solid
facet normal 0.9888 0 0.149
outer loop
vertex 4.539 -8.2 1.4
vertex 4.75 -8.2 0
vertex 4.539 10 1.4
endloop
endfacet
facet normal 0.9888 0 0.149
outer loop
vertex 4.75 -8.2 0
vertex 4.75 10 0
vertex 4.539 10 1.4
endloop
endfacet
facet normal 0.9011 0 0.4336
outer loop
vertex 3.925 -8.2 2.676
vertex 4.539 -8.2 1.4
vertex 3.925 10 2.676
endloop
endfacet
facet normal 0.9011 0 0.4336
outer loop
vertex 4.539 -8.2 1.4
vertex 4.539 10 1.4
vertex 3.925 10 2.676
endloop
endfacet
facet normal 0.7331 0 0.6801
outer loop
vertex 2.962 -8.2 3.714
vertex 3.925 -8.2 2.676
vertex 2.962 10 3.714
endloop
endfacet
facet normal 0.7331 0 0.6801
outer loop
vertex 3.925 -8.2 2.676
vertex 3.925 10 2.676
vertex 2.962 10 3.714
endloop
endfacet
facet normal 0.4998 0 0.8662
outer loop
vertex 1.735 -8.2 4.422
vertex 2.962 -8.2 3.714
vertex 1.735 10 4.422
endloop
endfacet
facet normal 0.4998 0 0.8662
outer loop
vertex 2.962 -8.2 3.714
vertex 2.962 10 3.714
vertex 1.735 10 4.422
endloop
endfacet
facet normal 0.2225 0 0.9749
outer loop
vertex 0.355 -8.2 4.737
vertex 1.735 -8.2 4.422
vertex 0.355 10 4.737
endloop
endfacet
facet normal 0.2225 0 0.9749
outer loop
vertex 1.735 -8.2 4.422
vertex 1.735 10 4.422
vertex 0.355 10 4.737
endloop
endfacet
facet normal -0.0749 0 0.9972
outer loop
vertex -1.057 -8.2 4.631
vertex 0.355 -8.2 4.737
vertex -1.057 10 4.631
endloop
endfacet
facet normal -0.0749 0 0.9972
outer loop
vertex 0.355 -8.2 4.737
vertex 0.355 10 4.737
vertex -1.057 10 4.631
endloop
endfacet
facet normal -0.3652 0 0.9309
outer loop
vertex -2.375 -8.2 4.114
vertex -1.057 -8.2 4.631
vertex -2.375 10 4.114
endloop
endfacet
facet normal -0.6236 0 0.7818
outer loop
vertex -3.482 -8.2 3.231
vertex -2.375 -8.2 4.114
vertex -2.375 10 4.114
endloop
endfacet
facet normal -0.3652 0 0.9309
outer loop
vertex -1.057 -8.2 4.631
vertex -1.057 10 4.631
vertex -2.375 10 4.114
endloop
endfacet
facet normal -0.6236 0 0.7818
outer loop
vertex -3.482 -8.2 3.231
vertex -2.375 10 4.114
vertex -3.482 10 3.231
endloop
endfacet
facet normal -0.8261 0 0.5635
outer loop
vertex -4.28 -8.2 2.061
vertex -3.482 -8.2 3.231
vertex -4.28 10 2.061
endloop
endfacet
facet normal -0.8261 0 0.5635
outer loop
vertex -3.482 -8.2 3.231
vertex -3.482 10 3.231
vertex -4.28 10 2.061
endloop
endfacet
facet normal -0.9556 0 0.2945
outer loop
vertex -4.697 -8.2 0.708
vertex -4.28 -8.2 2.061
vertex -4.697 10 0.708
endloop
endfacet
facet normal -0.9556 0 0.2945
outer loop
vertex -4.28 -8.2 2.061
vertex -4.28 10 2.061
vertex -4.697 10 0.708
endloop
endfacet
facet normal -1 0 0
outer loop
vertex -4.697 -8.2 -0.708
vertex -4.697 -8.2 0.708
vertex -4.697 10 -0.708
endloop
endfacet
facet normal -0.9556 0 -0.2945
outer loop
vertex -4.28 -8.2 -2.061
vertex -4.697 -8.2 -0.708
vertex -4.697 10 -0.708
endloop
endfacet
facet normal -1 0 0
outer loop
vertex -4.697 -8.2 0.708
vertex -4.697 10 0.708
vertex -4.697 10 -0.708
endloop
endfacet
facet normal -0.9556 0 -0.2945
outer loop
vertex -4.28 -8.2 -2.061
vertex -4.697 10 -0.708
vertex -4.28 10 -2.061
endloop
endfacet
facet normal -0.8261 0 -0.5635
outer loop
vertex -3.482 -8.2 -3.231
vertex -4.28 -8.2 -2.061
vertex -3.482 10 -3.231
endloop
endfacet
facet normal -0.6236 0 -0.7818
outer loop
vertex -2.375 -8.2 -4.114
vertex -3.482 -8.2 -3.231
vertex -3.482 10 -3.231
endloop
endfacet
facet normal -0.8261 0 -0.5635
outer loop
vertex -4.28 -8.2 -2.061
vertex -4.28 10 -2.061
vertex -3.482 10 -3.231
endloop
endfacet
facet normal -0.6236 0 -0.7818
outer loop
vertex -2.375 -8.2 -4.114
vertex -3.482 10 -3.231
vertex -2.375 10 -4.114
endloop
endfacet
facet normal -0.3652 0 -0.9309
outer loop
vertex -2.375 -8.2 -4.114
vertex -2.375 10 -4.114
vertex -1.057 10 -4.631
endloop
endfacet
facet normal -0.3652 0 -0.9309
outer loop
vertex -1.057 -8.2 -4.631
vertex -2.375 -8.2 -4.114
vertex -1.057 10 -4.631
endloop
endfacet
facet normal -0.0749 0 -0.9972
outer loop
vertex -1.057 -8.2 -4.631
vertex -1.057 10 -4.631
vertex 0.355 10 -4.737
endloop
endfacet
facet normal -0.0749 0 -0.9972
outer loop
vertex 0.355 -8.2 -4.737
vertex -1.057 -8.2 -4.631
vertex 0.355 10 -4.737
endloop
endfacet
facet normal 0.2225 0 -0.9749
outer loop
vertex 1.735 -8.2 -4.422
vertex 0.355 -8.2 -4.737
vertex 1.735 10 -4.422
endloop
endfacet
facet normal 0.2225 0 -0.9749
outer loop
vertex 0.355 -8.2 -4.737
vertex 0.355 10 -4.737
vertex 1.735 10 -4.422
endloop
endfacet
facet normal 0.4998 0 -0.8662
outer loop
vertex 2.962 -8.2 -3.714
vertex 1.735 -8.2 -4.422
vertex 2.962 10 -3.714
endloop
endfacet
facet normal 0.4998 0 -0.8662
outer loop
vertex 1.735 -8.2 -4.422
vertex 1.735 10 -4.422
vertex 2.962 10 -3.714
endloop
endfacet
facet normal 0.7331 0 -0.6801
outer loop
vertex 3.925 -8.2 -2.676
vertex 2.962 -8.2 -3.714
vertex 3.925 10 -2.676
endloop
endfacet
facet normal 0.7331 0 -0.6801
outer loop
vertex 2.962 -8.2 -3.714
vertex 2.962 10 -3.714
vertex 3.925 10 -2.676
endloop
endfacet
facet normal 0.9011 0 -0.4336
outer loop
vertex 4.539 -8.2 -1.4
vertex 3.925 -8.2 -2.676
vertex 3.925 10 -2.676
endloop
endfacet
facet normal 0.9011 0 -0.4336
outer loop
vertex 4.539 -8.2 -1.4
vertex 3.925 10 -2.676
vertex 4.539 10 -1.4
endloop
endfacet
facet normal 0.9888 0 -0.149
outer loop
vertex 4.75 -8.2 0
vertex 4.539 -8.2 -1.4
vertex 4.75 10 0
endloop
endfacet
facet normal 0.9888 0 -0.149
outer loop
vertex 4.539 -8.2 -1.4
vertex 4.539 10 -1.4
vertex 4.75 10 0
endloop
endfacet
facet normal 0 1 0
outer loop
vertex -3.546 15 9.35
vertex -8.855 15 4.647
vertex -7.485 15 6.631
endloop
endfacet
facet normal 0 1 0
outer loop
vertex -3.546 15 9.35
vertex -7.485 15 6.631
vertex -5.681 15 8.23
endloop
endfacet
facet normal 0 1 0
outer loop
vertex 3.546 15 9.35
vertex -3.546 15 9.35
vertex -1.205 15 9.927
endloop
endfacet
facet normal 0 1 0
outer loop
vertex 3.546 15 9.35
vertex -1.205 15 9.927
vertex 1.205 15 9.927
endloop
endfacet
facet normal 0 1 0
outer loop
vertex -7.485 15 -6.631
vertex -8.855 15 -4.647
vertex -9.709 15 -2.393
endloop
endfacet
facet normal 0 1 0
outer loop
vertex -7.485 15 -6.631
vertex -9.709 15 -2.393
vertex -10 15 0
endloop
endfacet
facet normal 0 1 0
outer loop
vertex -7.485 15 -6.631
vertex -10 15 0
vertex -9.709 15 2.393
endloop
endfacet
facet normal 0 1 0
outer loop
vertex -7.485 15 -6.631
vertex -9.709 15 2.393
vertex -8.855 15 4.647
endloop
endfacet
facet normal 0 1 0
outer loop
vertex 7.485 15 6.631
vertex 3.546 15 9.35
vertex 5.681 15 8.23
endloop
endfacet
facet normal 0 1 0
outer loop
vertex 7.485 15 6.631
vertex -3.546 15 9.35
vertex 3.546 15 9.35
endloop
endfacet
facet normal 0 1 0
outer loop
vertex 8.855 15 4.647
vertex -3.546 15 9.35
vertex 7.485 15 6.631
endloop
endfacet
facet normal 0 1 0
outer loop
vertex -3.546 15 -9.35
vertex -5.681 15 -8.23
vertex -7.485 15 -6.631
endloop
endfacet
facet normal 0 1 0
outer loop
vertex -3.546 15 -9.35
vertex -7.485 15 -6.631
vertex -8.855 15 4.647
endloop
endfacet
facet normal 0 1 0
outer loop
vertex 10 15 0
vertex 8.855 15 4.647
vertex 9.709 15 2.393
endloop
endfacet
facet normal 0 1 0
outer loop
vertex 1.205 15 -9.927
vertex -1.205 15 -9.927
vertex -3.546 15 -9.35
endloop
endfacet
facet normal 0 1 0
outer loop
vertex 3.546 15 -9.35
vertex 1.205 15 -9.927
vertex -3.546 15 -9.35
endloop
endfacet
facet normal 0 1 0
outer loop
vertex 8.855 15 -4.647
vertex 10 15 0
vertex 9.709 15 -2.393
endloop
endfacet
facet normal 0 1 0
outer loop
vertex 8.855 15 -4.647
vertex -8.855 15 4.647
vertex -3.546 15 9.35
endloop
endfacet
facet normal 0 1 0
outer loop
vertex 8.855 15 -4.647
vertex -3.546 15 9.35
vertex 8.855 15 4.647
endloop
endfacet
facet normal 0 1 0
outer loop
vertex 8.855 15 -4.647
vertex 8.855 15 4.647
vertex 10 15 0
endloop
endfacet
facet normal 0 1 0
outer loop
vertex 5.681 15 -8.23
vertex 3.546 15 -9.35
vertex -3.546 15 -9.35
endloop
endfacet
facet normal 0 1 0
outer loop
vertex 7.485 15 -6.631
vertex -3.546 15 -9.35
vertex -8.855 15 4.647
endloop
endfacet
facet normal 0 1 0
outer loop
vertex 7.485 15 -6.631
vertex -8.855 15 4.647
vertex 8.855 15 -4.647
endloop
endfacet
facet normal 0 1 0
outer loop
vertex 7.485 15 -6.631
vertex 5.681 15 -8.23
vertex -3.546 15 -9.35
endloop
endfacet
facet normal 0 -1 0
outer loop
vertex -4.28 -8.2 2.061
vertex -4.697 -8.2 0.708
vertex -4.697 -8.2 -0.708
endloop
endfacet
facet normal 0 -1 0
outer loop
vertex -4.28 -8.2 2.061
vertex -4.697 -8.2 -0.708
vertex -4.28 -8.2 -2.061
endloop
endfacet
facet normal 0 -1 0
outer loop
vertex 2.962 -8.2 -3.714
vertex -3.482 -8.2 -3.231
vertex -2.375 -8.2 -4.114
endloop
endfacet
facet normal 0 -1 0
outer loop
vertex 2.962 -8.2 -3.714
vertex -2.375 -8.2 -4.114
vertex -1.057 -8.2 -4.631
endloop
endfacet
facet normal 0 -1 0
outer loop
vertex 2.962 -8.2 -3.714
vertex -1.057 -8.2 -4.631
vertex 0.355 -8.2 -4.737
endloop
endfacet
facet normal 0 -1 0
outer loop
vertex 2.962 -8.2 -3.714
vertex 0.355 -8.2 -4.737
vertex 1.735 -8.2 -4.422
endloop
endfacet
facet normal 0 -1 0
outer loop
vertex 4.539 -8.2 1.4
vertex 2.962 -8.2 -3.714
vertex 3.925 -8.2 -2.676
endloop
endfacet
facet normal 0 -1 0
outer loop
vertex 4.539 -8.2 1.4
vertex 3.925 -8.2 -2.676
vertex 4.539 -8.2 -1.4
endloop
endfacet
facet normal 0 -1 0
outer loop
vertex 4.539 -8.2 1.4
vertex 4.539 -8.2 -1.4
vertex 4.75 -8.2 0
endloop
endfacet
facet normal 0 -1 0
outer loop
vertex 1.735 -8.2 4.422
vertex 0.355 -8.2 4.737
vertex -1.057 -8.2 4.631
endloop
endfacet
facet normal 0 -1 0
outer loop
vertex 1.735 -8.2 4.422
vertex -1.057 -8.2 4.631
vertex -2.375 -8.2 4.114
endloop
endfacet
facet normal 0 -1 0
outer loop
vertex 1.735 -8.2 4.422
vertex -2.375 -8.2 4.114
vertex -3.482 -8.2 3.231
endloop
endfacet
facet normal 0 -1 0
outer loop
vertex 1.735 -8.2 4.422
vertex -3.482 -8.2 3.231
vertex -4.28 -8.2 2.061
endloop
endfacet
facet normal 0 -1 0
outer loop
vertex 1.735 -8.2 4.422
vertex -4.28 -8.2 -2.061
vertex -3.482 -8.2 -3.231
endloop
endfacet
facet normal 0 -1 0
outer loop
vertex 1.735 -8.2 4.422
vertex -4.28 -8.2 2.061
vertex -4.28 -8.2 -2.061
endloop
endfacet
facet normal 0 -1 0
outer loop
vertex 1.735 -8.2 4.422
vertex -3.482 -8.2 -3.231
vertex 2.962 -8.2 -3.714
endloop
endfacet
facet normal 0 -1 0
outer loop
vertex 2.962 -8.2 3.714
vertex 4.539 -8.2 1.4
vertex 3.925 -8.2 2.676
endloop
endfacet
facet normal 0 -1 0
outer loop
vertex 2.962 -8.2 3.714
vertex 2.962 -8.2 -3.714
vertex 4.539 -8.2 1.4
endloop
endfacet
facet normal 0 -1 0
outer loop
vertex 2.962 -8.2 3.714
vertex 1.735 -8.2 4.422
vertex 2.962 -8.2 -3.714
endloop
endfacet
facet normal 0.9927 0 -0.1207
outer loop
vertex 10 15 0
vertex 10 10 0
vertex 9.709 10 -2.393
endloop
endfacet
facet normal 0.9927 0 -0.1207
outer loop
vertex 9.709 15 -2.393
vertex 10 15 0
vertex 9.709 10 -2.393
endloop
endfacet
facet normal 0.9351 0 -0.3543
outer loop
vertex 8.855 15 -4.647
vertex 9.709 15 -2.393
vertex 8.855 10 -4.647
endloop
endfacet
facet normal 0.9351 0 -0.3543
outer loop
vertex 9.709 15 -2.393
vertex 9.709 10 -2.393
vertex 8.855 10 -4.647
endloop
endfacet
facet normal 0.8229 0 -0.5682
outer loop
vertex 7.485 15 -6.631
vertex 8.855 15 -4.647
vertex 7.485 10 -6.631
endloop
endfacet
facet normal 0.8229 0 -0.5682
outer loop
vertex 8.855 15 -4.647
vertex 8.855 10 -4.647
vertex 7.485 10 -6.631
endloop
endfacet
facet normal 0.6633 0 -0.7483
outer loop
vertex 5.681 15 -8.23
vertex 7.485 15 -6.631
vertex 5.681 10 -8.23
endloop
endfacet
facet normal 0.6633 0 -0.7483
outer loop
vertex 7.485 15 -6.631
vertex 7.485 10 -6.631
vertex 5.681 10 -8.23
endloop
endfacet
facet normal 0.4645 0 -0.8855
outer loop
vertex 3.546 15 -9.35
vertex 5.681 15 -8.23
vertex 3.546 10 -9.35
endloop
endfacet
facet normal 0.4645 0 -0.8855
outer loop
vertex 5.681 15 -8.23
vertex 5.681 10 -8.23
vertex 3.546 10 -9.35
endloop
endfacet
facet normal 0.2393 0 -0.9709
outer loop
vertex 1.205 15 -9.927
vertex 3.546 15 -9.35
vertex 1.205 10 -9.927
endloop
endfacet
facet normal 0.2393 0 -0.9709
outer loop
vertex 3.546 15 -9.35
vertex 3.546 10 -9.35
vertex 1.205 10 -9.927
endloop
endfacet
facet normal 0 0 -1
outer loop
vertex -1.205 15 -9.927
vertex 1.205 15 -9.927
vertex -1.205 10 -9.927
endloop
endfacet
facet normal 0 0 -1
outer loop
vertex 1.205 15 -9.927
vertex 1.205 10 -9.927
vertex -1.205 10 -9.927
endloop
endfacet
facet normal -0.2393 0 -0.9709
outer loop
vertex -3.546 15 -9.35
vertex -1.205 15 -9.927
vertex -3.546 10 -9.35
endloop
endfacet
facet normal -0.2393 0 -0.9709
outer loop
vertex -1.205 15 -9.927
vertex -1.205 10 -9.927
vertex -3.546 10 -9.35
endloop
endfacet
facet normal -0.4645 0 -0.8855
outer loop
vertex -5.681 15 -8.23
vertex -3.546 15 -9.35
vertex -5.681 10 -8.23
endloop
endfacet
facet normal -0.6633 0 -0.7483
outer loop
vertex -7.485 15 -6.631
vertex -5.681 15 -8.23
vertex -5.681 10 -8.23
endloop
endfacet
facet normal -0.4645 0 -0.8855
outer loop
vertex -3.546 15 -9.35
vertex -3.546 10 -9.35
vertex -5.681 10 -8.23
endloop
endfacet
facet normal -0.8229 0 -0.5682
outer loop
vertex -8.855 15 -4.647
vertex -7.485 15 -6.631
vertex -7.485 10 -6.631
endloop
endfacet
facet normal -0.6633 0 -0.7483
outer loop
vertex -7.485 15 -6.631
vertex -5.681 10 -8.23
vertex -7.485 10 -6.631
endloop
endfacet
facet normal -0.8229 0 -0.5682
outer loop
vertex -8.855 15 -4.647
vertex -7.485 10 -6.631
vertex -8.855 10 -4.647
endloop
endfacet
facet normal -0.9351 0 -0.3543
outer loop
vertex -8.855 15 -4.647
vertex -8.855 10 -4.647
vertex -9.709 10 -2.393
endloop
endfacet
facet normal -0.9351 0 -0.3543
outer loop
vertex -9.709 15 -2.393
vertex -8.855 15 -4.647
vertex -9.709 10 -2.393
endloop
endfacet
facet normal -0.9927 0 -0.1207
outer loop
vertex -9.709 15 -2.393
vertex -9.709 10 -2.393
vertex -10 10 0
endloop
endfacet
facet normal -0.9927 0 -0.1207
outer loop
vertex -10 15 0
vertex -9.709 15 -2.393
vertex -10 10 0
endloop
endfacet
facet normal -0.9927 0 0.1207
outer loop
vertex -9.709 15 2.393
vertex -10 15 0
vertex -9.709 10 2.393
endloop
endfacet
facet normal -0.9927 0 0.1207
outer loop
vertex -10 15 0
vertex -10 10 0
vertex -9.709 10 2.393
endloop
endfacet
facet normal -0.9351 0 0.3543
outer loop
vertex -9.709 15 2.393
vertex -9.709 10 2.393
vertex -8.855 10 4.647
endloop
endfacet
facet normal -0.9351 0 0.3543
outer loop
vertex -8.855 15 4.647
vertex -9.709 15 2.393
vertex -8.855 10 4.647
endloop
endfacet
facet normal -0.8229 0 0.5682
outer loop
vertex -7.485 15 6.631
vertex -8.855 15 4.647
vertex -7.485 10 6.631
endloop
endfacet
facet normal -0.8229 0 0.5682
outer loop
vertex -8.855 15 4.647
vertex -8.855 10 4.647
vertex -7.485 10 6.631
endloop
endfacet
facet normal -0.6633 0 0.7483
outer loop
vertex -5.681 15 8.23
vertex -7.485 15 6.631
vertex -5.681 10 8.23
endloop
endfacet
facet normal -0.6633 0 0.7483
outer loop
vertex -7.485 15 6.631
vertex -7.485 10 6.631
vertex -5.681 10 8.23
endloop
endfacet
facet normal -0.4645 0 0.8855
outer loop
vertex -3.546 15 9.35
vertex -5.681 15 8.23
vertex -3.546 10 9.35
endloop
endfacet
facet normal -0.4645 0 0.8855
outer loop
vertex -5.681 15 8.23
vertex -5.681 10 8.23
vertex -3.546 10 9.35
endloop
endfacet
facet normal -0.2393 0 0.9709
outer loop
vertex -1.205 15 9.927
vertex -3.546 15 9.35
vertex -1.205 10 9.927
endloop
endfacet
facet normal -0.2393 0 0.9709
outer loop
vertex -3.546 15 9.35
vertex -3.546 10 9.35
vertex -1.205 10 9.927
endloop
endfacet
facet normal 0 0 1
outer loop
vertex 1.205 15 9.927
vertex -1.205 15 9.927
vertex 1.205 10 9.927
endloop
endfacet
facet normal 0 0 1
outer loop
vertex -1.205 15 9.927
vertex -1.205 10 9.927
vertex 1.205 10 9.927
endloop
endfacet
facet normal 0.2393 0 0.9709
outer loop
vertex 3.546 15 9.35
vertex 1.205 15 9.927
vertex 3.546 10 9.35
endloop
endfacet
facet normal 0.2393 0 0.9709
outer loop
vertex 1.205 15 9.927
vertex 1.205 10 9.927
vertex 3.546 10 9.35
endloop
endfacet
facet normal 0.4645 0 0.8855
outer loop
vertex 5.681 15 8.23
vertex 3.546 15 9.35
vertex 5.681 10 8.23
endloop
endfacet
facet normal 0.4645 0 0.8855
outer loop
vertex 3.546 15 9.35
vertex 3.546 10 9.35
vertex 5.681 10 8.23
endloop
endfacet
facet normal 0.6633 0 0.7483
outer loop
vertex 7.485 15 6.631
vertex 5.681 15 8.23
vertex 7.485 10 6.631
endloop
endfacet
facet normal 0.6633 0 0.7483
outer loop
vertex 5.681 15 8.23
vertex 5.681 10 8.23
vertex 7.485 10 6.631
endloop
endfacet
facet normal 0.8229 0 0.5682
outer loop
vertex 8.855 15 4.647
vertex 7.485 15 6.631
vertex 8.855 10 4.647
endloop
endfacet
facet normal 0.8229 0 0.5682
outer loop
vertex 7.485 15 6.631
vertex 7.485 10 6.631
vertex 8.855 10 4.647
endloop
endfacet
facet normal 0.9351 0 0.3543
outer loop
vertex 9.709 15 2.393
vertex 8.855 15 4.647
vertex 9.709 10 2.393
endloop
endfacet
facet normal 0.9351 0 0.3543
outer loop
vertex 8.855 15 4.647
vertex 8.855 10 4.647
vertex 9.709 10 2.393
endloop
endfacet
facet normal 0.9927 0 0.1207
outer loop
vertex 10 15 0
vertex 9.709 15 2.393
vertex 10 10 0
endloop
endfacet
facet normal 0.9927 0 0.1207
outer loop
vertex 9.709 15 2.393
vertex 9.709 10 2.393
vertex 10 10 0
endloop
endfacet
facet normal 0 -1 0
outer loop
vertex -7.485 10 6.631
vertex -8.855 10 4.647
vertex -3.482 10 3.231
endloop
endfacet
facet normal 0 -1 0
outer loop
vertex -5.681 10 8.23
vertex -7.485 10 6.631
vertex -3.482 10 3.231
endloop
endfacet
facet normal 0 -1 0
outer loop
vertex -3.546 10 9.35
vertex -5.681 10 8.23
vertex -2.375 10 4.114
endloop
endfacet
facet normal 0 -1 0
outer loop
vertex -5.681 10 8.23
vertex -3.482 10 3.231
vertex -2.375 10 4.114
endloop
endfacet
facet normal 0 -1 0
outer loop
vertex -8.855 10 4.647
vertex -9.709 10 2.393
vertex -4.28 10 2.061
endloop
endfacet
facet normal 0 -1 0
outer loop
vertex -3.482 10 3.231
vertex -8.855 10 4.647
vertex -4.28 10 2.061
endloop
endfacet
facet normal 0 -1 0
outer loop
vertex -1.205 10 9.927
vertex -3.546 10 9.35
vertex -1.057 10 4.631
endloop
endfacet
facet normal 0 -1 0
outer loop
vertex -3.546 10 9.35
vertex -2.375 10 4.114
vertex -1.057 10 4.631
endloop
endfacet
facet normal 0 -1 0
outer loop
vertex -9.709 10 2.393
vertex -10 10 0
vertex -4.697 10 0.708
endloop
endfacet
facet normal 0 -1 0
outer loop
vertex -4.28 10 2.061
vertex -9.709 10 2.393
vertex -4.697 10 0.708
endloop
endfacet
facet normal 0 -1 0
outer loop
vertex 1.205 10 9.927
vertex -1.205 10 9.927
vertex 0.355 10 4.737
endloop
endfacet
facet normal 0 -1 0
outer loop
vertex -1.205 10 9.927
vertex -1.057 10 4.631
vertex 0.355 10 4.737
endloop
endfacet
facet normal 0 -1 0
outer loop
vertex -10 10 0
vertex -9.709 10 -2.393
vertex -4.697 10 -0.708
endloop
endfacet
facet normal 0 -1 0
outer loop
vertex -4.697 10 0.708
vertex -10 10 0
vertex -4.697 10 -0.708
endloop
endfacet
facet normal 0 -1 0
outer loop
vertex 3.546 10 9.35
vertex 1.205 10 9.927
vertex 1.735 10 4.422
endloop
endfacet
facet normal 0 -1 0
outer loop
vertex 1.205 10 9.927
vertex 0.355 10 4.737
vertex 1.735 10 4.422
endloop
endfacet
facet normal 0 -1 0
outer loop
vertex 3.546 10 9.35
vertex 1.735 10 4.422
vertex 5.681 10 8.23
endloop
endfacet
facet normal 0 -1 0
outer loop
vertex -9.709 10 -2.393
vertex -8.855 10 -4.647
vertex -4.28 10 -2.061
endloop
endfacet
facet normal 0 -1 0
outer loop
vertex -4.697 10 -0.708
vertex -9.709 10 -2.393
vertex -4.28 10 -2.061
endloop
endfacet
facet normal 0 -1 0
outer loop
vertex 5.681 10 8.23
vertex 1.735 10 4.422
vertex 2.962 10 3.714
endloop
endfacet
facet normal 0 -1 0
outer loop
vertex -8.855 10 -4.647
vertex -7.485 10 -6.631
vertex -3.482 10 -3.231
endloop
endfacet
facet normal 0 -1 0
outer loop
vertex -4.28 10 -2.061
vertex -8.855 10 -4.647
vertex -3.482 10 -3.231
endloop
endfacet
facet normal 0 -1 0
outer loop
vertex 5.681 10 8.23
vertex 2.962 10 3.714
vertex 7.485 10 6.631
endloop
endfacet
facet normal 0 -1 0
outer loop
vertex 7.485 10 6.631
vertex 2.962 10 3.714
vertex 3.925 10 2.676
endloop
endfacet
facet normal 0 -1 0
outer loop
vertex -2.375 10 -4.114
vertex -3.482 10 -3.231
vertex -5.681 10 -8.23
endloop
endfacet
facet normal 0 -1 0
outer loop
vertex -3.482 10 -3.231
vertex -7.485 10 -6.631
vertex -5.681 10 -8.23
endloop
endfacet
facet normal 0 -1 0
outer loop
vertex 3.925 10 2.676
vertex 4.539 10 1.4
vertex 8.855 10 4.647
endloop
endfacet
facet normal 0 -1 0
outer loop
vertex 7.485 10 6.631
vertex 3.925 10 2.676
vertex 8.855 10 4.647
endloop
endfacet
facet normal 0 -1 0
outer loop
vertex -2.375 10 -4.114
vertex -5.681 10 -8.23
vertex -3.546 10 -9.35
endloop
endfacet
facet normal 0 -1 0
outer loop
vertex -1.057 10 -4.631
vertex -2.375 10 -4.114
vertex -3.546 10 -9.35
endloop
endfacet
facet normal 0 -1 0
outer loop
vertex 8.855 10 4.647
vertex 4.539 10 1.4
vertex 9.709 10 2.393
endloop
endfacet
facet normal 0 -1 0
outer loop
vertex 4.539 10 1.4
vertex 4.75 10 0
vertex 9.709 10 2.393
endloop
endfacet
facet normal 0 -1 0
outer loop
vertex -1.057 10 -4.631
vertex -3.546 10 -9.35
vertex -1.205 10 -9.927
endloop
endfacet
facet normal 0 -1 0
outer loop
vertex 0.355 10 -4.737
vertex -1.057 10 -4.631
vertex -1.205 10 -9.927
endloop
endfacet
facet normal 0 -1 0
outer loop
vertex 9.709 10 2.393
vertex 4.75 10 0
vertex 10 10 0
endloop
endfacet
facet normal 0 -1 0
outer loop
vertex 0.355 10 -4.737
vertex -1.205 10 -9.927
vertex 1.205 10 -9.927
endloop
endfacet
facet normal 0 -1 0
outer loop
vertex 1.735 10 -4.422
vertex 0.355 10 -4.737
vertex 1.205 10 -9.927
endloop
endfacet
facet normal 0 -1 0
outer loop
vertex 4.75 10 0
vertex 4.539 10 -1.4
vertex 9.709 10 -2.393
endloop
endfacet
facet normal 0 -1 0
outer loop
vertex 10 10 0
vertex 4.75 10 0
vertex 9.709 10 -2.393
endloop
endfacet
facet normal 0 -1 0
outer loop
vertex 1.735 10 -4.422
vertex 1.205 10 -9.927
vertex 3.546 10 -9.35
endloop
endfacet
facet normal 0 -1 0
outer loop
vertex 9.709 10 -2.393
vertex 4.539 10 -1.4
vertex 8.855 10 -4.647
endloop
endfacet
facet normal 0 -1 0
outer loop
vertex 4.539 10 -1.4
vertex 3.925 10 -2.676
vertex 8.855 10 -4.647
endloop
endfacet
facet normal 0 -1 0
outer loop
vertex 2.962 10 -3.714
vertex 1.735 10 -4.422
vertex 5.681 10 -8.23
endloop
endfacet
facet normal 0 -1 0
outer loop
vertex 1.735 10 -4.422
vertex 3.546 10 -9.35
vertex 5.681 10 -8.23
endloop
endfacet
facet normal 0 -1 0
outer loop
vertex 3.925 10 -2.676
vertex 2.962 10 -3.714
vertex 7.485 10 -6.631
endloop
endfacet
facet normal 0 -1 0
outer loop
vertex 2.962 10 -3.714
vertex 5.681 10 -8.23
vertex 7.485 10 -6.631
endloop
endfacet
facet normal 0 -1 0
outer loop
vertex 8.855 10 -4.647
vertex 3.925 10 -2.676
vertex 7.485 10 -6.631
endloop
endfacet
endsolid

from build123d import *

# Parameters (mm, degrees)
SKETCH1_R           = 4.75
BOSS_EXTRUDE1_DEPTH = 10
SKETCH2_R           = 10
BOSS_EXTRUDE2_DEPTH = 5
SKETCH3_R           = 4.75
BOSS_EXTRUDE3_DEPTH = 13.2
SKETCH4_R           = 4.75
CUT_EXTRUDE1_DEPTH  = 5


with BuildPart() as part:
    # Sketch1 → Boss-Extrude1 (new body)
    with BuildSketch(Plane(origin=(0, 0, 0), x_dir=(1, 0, 0), z_dir=(0, 1, 0))):
        Circle(SKETCH1_R)
    extrude(amount=BOSS_EXTRUDE1_DEPTH)

    # Sketch2 → Boss-Extrude2 (add)
    with BuildSketch(Plane(origin=(0, 10, 0), x_dir=(1, 0, 0), z_dir=(0, 1, 0))):
        Circle(SKETCH2_R)
    extrude(amount=BOSS_EXTRUDE2_DEPTH)

    # Sketch3 → Boss-Extrude3 (add)
    with BuildSketch(Plane.XZ):
        Circle(SKETCH3_R)
    extrude(amount=BOSS_EXTRUDE3_DEPTH)

    # Sketch4 → Cut-Extrude1 (cut)
    with BuildSketch(Plane.XZ.offset(13.2)):
        Circle(SKETCH4_R)
    extrude(amount=-CUT_EXTRUDE1_DEPTH, mode=Mode.SUBTRACT)


solid = part.part
